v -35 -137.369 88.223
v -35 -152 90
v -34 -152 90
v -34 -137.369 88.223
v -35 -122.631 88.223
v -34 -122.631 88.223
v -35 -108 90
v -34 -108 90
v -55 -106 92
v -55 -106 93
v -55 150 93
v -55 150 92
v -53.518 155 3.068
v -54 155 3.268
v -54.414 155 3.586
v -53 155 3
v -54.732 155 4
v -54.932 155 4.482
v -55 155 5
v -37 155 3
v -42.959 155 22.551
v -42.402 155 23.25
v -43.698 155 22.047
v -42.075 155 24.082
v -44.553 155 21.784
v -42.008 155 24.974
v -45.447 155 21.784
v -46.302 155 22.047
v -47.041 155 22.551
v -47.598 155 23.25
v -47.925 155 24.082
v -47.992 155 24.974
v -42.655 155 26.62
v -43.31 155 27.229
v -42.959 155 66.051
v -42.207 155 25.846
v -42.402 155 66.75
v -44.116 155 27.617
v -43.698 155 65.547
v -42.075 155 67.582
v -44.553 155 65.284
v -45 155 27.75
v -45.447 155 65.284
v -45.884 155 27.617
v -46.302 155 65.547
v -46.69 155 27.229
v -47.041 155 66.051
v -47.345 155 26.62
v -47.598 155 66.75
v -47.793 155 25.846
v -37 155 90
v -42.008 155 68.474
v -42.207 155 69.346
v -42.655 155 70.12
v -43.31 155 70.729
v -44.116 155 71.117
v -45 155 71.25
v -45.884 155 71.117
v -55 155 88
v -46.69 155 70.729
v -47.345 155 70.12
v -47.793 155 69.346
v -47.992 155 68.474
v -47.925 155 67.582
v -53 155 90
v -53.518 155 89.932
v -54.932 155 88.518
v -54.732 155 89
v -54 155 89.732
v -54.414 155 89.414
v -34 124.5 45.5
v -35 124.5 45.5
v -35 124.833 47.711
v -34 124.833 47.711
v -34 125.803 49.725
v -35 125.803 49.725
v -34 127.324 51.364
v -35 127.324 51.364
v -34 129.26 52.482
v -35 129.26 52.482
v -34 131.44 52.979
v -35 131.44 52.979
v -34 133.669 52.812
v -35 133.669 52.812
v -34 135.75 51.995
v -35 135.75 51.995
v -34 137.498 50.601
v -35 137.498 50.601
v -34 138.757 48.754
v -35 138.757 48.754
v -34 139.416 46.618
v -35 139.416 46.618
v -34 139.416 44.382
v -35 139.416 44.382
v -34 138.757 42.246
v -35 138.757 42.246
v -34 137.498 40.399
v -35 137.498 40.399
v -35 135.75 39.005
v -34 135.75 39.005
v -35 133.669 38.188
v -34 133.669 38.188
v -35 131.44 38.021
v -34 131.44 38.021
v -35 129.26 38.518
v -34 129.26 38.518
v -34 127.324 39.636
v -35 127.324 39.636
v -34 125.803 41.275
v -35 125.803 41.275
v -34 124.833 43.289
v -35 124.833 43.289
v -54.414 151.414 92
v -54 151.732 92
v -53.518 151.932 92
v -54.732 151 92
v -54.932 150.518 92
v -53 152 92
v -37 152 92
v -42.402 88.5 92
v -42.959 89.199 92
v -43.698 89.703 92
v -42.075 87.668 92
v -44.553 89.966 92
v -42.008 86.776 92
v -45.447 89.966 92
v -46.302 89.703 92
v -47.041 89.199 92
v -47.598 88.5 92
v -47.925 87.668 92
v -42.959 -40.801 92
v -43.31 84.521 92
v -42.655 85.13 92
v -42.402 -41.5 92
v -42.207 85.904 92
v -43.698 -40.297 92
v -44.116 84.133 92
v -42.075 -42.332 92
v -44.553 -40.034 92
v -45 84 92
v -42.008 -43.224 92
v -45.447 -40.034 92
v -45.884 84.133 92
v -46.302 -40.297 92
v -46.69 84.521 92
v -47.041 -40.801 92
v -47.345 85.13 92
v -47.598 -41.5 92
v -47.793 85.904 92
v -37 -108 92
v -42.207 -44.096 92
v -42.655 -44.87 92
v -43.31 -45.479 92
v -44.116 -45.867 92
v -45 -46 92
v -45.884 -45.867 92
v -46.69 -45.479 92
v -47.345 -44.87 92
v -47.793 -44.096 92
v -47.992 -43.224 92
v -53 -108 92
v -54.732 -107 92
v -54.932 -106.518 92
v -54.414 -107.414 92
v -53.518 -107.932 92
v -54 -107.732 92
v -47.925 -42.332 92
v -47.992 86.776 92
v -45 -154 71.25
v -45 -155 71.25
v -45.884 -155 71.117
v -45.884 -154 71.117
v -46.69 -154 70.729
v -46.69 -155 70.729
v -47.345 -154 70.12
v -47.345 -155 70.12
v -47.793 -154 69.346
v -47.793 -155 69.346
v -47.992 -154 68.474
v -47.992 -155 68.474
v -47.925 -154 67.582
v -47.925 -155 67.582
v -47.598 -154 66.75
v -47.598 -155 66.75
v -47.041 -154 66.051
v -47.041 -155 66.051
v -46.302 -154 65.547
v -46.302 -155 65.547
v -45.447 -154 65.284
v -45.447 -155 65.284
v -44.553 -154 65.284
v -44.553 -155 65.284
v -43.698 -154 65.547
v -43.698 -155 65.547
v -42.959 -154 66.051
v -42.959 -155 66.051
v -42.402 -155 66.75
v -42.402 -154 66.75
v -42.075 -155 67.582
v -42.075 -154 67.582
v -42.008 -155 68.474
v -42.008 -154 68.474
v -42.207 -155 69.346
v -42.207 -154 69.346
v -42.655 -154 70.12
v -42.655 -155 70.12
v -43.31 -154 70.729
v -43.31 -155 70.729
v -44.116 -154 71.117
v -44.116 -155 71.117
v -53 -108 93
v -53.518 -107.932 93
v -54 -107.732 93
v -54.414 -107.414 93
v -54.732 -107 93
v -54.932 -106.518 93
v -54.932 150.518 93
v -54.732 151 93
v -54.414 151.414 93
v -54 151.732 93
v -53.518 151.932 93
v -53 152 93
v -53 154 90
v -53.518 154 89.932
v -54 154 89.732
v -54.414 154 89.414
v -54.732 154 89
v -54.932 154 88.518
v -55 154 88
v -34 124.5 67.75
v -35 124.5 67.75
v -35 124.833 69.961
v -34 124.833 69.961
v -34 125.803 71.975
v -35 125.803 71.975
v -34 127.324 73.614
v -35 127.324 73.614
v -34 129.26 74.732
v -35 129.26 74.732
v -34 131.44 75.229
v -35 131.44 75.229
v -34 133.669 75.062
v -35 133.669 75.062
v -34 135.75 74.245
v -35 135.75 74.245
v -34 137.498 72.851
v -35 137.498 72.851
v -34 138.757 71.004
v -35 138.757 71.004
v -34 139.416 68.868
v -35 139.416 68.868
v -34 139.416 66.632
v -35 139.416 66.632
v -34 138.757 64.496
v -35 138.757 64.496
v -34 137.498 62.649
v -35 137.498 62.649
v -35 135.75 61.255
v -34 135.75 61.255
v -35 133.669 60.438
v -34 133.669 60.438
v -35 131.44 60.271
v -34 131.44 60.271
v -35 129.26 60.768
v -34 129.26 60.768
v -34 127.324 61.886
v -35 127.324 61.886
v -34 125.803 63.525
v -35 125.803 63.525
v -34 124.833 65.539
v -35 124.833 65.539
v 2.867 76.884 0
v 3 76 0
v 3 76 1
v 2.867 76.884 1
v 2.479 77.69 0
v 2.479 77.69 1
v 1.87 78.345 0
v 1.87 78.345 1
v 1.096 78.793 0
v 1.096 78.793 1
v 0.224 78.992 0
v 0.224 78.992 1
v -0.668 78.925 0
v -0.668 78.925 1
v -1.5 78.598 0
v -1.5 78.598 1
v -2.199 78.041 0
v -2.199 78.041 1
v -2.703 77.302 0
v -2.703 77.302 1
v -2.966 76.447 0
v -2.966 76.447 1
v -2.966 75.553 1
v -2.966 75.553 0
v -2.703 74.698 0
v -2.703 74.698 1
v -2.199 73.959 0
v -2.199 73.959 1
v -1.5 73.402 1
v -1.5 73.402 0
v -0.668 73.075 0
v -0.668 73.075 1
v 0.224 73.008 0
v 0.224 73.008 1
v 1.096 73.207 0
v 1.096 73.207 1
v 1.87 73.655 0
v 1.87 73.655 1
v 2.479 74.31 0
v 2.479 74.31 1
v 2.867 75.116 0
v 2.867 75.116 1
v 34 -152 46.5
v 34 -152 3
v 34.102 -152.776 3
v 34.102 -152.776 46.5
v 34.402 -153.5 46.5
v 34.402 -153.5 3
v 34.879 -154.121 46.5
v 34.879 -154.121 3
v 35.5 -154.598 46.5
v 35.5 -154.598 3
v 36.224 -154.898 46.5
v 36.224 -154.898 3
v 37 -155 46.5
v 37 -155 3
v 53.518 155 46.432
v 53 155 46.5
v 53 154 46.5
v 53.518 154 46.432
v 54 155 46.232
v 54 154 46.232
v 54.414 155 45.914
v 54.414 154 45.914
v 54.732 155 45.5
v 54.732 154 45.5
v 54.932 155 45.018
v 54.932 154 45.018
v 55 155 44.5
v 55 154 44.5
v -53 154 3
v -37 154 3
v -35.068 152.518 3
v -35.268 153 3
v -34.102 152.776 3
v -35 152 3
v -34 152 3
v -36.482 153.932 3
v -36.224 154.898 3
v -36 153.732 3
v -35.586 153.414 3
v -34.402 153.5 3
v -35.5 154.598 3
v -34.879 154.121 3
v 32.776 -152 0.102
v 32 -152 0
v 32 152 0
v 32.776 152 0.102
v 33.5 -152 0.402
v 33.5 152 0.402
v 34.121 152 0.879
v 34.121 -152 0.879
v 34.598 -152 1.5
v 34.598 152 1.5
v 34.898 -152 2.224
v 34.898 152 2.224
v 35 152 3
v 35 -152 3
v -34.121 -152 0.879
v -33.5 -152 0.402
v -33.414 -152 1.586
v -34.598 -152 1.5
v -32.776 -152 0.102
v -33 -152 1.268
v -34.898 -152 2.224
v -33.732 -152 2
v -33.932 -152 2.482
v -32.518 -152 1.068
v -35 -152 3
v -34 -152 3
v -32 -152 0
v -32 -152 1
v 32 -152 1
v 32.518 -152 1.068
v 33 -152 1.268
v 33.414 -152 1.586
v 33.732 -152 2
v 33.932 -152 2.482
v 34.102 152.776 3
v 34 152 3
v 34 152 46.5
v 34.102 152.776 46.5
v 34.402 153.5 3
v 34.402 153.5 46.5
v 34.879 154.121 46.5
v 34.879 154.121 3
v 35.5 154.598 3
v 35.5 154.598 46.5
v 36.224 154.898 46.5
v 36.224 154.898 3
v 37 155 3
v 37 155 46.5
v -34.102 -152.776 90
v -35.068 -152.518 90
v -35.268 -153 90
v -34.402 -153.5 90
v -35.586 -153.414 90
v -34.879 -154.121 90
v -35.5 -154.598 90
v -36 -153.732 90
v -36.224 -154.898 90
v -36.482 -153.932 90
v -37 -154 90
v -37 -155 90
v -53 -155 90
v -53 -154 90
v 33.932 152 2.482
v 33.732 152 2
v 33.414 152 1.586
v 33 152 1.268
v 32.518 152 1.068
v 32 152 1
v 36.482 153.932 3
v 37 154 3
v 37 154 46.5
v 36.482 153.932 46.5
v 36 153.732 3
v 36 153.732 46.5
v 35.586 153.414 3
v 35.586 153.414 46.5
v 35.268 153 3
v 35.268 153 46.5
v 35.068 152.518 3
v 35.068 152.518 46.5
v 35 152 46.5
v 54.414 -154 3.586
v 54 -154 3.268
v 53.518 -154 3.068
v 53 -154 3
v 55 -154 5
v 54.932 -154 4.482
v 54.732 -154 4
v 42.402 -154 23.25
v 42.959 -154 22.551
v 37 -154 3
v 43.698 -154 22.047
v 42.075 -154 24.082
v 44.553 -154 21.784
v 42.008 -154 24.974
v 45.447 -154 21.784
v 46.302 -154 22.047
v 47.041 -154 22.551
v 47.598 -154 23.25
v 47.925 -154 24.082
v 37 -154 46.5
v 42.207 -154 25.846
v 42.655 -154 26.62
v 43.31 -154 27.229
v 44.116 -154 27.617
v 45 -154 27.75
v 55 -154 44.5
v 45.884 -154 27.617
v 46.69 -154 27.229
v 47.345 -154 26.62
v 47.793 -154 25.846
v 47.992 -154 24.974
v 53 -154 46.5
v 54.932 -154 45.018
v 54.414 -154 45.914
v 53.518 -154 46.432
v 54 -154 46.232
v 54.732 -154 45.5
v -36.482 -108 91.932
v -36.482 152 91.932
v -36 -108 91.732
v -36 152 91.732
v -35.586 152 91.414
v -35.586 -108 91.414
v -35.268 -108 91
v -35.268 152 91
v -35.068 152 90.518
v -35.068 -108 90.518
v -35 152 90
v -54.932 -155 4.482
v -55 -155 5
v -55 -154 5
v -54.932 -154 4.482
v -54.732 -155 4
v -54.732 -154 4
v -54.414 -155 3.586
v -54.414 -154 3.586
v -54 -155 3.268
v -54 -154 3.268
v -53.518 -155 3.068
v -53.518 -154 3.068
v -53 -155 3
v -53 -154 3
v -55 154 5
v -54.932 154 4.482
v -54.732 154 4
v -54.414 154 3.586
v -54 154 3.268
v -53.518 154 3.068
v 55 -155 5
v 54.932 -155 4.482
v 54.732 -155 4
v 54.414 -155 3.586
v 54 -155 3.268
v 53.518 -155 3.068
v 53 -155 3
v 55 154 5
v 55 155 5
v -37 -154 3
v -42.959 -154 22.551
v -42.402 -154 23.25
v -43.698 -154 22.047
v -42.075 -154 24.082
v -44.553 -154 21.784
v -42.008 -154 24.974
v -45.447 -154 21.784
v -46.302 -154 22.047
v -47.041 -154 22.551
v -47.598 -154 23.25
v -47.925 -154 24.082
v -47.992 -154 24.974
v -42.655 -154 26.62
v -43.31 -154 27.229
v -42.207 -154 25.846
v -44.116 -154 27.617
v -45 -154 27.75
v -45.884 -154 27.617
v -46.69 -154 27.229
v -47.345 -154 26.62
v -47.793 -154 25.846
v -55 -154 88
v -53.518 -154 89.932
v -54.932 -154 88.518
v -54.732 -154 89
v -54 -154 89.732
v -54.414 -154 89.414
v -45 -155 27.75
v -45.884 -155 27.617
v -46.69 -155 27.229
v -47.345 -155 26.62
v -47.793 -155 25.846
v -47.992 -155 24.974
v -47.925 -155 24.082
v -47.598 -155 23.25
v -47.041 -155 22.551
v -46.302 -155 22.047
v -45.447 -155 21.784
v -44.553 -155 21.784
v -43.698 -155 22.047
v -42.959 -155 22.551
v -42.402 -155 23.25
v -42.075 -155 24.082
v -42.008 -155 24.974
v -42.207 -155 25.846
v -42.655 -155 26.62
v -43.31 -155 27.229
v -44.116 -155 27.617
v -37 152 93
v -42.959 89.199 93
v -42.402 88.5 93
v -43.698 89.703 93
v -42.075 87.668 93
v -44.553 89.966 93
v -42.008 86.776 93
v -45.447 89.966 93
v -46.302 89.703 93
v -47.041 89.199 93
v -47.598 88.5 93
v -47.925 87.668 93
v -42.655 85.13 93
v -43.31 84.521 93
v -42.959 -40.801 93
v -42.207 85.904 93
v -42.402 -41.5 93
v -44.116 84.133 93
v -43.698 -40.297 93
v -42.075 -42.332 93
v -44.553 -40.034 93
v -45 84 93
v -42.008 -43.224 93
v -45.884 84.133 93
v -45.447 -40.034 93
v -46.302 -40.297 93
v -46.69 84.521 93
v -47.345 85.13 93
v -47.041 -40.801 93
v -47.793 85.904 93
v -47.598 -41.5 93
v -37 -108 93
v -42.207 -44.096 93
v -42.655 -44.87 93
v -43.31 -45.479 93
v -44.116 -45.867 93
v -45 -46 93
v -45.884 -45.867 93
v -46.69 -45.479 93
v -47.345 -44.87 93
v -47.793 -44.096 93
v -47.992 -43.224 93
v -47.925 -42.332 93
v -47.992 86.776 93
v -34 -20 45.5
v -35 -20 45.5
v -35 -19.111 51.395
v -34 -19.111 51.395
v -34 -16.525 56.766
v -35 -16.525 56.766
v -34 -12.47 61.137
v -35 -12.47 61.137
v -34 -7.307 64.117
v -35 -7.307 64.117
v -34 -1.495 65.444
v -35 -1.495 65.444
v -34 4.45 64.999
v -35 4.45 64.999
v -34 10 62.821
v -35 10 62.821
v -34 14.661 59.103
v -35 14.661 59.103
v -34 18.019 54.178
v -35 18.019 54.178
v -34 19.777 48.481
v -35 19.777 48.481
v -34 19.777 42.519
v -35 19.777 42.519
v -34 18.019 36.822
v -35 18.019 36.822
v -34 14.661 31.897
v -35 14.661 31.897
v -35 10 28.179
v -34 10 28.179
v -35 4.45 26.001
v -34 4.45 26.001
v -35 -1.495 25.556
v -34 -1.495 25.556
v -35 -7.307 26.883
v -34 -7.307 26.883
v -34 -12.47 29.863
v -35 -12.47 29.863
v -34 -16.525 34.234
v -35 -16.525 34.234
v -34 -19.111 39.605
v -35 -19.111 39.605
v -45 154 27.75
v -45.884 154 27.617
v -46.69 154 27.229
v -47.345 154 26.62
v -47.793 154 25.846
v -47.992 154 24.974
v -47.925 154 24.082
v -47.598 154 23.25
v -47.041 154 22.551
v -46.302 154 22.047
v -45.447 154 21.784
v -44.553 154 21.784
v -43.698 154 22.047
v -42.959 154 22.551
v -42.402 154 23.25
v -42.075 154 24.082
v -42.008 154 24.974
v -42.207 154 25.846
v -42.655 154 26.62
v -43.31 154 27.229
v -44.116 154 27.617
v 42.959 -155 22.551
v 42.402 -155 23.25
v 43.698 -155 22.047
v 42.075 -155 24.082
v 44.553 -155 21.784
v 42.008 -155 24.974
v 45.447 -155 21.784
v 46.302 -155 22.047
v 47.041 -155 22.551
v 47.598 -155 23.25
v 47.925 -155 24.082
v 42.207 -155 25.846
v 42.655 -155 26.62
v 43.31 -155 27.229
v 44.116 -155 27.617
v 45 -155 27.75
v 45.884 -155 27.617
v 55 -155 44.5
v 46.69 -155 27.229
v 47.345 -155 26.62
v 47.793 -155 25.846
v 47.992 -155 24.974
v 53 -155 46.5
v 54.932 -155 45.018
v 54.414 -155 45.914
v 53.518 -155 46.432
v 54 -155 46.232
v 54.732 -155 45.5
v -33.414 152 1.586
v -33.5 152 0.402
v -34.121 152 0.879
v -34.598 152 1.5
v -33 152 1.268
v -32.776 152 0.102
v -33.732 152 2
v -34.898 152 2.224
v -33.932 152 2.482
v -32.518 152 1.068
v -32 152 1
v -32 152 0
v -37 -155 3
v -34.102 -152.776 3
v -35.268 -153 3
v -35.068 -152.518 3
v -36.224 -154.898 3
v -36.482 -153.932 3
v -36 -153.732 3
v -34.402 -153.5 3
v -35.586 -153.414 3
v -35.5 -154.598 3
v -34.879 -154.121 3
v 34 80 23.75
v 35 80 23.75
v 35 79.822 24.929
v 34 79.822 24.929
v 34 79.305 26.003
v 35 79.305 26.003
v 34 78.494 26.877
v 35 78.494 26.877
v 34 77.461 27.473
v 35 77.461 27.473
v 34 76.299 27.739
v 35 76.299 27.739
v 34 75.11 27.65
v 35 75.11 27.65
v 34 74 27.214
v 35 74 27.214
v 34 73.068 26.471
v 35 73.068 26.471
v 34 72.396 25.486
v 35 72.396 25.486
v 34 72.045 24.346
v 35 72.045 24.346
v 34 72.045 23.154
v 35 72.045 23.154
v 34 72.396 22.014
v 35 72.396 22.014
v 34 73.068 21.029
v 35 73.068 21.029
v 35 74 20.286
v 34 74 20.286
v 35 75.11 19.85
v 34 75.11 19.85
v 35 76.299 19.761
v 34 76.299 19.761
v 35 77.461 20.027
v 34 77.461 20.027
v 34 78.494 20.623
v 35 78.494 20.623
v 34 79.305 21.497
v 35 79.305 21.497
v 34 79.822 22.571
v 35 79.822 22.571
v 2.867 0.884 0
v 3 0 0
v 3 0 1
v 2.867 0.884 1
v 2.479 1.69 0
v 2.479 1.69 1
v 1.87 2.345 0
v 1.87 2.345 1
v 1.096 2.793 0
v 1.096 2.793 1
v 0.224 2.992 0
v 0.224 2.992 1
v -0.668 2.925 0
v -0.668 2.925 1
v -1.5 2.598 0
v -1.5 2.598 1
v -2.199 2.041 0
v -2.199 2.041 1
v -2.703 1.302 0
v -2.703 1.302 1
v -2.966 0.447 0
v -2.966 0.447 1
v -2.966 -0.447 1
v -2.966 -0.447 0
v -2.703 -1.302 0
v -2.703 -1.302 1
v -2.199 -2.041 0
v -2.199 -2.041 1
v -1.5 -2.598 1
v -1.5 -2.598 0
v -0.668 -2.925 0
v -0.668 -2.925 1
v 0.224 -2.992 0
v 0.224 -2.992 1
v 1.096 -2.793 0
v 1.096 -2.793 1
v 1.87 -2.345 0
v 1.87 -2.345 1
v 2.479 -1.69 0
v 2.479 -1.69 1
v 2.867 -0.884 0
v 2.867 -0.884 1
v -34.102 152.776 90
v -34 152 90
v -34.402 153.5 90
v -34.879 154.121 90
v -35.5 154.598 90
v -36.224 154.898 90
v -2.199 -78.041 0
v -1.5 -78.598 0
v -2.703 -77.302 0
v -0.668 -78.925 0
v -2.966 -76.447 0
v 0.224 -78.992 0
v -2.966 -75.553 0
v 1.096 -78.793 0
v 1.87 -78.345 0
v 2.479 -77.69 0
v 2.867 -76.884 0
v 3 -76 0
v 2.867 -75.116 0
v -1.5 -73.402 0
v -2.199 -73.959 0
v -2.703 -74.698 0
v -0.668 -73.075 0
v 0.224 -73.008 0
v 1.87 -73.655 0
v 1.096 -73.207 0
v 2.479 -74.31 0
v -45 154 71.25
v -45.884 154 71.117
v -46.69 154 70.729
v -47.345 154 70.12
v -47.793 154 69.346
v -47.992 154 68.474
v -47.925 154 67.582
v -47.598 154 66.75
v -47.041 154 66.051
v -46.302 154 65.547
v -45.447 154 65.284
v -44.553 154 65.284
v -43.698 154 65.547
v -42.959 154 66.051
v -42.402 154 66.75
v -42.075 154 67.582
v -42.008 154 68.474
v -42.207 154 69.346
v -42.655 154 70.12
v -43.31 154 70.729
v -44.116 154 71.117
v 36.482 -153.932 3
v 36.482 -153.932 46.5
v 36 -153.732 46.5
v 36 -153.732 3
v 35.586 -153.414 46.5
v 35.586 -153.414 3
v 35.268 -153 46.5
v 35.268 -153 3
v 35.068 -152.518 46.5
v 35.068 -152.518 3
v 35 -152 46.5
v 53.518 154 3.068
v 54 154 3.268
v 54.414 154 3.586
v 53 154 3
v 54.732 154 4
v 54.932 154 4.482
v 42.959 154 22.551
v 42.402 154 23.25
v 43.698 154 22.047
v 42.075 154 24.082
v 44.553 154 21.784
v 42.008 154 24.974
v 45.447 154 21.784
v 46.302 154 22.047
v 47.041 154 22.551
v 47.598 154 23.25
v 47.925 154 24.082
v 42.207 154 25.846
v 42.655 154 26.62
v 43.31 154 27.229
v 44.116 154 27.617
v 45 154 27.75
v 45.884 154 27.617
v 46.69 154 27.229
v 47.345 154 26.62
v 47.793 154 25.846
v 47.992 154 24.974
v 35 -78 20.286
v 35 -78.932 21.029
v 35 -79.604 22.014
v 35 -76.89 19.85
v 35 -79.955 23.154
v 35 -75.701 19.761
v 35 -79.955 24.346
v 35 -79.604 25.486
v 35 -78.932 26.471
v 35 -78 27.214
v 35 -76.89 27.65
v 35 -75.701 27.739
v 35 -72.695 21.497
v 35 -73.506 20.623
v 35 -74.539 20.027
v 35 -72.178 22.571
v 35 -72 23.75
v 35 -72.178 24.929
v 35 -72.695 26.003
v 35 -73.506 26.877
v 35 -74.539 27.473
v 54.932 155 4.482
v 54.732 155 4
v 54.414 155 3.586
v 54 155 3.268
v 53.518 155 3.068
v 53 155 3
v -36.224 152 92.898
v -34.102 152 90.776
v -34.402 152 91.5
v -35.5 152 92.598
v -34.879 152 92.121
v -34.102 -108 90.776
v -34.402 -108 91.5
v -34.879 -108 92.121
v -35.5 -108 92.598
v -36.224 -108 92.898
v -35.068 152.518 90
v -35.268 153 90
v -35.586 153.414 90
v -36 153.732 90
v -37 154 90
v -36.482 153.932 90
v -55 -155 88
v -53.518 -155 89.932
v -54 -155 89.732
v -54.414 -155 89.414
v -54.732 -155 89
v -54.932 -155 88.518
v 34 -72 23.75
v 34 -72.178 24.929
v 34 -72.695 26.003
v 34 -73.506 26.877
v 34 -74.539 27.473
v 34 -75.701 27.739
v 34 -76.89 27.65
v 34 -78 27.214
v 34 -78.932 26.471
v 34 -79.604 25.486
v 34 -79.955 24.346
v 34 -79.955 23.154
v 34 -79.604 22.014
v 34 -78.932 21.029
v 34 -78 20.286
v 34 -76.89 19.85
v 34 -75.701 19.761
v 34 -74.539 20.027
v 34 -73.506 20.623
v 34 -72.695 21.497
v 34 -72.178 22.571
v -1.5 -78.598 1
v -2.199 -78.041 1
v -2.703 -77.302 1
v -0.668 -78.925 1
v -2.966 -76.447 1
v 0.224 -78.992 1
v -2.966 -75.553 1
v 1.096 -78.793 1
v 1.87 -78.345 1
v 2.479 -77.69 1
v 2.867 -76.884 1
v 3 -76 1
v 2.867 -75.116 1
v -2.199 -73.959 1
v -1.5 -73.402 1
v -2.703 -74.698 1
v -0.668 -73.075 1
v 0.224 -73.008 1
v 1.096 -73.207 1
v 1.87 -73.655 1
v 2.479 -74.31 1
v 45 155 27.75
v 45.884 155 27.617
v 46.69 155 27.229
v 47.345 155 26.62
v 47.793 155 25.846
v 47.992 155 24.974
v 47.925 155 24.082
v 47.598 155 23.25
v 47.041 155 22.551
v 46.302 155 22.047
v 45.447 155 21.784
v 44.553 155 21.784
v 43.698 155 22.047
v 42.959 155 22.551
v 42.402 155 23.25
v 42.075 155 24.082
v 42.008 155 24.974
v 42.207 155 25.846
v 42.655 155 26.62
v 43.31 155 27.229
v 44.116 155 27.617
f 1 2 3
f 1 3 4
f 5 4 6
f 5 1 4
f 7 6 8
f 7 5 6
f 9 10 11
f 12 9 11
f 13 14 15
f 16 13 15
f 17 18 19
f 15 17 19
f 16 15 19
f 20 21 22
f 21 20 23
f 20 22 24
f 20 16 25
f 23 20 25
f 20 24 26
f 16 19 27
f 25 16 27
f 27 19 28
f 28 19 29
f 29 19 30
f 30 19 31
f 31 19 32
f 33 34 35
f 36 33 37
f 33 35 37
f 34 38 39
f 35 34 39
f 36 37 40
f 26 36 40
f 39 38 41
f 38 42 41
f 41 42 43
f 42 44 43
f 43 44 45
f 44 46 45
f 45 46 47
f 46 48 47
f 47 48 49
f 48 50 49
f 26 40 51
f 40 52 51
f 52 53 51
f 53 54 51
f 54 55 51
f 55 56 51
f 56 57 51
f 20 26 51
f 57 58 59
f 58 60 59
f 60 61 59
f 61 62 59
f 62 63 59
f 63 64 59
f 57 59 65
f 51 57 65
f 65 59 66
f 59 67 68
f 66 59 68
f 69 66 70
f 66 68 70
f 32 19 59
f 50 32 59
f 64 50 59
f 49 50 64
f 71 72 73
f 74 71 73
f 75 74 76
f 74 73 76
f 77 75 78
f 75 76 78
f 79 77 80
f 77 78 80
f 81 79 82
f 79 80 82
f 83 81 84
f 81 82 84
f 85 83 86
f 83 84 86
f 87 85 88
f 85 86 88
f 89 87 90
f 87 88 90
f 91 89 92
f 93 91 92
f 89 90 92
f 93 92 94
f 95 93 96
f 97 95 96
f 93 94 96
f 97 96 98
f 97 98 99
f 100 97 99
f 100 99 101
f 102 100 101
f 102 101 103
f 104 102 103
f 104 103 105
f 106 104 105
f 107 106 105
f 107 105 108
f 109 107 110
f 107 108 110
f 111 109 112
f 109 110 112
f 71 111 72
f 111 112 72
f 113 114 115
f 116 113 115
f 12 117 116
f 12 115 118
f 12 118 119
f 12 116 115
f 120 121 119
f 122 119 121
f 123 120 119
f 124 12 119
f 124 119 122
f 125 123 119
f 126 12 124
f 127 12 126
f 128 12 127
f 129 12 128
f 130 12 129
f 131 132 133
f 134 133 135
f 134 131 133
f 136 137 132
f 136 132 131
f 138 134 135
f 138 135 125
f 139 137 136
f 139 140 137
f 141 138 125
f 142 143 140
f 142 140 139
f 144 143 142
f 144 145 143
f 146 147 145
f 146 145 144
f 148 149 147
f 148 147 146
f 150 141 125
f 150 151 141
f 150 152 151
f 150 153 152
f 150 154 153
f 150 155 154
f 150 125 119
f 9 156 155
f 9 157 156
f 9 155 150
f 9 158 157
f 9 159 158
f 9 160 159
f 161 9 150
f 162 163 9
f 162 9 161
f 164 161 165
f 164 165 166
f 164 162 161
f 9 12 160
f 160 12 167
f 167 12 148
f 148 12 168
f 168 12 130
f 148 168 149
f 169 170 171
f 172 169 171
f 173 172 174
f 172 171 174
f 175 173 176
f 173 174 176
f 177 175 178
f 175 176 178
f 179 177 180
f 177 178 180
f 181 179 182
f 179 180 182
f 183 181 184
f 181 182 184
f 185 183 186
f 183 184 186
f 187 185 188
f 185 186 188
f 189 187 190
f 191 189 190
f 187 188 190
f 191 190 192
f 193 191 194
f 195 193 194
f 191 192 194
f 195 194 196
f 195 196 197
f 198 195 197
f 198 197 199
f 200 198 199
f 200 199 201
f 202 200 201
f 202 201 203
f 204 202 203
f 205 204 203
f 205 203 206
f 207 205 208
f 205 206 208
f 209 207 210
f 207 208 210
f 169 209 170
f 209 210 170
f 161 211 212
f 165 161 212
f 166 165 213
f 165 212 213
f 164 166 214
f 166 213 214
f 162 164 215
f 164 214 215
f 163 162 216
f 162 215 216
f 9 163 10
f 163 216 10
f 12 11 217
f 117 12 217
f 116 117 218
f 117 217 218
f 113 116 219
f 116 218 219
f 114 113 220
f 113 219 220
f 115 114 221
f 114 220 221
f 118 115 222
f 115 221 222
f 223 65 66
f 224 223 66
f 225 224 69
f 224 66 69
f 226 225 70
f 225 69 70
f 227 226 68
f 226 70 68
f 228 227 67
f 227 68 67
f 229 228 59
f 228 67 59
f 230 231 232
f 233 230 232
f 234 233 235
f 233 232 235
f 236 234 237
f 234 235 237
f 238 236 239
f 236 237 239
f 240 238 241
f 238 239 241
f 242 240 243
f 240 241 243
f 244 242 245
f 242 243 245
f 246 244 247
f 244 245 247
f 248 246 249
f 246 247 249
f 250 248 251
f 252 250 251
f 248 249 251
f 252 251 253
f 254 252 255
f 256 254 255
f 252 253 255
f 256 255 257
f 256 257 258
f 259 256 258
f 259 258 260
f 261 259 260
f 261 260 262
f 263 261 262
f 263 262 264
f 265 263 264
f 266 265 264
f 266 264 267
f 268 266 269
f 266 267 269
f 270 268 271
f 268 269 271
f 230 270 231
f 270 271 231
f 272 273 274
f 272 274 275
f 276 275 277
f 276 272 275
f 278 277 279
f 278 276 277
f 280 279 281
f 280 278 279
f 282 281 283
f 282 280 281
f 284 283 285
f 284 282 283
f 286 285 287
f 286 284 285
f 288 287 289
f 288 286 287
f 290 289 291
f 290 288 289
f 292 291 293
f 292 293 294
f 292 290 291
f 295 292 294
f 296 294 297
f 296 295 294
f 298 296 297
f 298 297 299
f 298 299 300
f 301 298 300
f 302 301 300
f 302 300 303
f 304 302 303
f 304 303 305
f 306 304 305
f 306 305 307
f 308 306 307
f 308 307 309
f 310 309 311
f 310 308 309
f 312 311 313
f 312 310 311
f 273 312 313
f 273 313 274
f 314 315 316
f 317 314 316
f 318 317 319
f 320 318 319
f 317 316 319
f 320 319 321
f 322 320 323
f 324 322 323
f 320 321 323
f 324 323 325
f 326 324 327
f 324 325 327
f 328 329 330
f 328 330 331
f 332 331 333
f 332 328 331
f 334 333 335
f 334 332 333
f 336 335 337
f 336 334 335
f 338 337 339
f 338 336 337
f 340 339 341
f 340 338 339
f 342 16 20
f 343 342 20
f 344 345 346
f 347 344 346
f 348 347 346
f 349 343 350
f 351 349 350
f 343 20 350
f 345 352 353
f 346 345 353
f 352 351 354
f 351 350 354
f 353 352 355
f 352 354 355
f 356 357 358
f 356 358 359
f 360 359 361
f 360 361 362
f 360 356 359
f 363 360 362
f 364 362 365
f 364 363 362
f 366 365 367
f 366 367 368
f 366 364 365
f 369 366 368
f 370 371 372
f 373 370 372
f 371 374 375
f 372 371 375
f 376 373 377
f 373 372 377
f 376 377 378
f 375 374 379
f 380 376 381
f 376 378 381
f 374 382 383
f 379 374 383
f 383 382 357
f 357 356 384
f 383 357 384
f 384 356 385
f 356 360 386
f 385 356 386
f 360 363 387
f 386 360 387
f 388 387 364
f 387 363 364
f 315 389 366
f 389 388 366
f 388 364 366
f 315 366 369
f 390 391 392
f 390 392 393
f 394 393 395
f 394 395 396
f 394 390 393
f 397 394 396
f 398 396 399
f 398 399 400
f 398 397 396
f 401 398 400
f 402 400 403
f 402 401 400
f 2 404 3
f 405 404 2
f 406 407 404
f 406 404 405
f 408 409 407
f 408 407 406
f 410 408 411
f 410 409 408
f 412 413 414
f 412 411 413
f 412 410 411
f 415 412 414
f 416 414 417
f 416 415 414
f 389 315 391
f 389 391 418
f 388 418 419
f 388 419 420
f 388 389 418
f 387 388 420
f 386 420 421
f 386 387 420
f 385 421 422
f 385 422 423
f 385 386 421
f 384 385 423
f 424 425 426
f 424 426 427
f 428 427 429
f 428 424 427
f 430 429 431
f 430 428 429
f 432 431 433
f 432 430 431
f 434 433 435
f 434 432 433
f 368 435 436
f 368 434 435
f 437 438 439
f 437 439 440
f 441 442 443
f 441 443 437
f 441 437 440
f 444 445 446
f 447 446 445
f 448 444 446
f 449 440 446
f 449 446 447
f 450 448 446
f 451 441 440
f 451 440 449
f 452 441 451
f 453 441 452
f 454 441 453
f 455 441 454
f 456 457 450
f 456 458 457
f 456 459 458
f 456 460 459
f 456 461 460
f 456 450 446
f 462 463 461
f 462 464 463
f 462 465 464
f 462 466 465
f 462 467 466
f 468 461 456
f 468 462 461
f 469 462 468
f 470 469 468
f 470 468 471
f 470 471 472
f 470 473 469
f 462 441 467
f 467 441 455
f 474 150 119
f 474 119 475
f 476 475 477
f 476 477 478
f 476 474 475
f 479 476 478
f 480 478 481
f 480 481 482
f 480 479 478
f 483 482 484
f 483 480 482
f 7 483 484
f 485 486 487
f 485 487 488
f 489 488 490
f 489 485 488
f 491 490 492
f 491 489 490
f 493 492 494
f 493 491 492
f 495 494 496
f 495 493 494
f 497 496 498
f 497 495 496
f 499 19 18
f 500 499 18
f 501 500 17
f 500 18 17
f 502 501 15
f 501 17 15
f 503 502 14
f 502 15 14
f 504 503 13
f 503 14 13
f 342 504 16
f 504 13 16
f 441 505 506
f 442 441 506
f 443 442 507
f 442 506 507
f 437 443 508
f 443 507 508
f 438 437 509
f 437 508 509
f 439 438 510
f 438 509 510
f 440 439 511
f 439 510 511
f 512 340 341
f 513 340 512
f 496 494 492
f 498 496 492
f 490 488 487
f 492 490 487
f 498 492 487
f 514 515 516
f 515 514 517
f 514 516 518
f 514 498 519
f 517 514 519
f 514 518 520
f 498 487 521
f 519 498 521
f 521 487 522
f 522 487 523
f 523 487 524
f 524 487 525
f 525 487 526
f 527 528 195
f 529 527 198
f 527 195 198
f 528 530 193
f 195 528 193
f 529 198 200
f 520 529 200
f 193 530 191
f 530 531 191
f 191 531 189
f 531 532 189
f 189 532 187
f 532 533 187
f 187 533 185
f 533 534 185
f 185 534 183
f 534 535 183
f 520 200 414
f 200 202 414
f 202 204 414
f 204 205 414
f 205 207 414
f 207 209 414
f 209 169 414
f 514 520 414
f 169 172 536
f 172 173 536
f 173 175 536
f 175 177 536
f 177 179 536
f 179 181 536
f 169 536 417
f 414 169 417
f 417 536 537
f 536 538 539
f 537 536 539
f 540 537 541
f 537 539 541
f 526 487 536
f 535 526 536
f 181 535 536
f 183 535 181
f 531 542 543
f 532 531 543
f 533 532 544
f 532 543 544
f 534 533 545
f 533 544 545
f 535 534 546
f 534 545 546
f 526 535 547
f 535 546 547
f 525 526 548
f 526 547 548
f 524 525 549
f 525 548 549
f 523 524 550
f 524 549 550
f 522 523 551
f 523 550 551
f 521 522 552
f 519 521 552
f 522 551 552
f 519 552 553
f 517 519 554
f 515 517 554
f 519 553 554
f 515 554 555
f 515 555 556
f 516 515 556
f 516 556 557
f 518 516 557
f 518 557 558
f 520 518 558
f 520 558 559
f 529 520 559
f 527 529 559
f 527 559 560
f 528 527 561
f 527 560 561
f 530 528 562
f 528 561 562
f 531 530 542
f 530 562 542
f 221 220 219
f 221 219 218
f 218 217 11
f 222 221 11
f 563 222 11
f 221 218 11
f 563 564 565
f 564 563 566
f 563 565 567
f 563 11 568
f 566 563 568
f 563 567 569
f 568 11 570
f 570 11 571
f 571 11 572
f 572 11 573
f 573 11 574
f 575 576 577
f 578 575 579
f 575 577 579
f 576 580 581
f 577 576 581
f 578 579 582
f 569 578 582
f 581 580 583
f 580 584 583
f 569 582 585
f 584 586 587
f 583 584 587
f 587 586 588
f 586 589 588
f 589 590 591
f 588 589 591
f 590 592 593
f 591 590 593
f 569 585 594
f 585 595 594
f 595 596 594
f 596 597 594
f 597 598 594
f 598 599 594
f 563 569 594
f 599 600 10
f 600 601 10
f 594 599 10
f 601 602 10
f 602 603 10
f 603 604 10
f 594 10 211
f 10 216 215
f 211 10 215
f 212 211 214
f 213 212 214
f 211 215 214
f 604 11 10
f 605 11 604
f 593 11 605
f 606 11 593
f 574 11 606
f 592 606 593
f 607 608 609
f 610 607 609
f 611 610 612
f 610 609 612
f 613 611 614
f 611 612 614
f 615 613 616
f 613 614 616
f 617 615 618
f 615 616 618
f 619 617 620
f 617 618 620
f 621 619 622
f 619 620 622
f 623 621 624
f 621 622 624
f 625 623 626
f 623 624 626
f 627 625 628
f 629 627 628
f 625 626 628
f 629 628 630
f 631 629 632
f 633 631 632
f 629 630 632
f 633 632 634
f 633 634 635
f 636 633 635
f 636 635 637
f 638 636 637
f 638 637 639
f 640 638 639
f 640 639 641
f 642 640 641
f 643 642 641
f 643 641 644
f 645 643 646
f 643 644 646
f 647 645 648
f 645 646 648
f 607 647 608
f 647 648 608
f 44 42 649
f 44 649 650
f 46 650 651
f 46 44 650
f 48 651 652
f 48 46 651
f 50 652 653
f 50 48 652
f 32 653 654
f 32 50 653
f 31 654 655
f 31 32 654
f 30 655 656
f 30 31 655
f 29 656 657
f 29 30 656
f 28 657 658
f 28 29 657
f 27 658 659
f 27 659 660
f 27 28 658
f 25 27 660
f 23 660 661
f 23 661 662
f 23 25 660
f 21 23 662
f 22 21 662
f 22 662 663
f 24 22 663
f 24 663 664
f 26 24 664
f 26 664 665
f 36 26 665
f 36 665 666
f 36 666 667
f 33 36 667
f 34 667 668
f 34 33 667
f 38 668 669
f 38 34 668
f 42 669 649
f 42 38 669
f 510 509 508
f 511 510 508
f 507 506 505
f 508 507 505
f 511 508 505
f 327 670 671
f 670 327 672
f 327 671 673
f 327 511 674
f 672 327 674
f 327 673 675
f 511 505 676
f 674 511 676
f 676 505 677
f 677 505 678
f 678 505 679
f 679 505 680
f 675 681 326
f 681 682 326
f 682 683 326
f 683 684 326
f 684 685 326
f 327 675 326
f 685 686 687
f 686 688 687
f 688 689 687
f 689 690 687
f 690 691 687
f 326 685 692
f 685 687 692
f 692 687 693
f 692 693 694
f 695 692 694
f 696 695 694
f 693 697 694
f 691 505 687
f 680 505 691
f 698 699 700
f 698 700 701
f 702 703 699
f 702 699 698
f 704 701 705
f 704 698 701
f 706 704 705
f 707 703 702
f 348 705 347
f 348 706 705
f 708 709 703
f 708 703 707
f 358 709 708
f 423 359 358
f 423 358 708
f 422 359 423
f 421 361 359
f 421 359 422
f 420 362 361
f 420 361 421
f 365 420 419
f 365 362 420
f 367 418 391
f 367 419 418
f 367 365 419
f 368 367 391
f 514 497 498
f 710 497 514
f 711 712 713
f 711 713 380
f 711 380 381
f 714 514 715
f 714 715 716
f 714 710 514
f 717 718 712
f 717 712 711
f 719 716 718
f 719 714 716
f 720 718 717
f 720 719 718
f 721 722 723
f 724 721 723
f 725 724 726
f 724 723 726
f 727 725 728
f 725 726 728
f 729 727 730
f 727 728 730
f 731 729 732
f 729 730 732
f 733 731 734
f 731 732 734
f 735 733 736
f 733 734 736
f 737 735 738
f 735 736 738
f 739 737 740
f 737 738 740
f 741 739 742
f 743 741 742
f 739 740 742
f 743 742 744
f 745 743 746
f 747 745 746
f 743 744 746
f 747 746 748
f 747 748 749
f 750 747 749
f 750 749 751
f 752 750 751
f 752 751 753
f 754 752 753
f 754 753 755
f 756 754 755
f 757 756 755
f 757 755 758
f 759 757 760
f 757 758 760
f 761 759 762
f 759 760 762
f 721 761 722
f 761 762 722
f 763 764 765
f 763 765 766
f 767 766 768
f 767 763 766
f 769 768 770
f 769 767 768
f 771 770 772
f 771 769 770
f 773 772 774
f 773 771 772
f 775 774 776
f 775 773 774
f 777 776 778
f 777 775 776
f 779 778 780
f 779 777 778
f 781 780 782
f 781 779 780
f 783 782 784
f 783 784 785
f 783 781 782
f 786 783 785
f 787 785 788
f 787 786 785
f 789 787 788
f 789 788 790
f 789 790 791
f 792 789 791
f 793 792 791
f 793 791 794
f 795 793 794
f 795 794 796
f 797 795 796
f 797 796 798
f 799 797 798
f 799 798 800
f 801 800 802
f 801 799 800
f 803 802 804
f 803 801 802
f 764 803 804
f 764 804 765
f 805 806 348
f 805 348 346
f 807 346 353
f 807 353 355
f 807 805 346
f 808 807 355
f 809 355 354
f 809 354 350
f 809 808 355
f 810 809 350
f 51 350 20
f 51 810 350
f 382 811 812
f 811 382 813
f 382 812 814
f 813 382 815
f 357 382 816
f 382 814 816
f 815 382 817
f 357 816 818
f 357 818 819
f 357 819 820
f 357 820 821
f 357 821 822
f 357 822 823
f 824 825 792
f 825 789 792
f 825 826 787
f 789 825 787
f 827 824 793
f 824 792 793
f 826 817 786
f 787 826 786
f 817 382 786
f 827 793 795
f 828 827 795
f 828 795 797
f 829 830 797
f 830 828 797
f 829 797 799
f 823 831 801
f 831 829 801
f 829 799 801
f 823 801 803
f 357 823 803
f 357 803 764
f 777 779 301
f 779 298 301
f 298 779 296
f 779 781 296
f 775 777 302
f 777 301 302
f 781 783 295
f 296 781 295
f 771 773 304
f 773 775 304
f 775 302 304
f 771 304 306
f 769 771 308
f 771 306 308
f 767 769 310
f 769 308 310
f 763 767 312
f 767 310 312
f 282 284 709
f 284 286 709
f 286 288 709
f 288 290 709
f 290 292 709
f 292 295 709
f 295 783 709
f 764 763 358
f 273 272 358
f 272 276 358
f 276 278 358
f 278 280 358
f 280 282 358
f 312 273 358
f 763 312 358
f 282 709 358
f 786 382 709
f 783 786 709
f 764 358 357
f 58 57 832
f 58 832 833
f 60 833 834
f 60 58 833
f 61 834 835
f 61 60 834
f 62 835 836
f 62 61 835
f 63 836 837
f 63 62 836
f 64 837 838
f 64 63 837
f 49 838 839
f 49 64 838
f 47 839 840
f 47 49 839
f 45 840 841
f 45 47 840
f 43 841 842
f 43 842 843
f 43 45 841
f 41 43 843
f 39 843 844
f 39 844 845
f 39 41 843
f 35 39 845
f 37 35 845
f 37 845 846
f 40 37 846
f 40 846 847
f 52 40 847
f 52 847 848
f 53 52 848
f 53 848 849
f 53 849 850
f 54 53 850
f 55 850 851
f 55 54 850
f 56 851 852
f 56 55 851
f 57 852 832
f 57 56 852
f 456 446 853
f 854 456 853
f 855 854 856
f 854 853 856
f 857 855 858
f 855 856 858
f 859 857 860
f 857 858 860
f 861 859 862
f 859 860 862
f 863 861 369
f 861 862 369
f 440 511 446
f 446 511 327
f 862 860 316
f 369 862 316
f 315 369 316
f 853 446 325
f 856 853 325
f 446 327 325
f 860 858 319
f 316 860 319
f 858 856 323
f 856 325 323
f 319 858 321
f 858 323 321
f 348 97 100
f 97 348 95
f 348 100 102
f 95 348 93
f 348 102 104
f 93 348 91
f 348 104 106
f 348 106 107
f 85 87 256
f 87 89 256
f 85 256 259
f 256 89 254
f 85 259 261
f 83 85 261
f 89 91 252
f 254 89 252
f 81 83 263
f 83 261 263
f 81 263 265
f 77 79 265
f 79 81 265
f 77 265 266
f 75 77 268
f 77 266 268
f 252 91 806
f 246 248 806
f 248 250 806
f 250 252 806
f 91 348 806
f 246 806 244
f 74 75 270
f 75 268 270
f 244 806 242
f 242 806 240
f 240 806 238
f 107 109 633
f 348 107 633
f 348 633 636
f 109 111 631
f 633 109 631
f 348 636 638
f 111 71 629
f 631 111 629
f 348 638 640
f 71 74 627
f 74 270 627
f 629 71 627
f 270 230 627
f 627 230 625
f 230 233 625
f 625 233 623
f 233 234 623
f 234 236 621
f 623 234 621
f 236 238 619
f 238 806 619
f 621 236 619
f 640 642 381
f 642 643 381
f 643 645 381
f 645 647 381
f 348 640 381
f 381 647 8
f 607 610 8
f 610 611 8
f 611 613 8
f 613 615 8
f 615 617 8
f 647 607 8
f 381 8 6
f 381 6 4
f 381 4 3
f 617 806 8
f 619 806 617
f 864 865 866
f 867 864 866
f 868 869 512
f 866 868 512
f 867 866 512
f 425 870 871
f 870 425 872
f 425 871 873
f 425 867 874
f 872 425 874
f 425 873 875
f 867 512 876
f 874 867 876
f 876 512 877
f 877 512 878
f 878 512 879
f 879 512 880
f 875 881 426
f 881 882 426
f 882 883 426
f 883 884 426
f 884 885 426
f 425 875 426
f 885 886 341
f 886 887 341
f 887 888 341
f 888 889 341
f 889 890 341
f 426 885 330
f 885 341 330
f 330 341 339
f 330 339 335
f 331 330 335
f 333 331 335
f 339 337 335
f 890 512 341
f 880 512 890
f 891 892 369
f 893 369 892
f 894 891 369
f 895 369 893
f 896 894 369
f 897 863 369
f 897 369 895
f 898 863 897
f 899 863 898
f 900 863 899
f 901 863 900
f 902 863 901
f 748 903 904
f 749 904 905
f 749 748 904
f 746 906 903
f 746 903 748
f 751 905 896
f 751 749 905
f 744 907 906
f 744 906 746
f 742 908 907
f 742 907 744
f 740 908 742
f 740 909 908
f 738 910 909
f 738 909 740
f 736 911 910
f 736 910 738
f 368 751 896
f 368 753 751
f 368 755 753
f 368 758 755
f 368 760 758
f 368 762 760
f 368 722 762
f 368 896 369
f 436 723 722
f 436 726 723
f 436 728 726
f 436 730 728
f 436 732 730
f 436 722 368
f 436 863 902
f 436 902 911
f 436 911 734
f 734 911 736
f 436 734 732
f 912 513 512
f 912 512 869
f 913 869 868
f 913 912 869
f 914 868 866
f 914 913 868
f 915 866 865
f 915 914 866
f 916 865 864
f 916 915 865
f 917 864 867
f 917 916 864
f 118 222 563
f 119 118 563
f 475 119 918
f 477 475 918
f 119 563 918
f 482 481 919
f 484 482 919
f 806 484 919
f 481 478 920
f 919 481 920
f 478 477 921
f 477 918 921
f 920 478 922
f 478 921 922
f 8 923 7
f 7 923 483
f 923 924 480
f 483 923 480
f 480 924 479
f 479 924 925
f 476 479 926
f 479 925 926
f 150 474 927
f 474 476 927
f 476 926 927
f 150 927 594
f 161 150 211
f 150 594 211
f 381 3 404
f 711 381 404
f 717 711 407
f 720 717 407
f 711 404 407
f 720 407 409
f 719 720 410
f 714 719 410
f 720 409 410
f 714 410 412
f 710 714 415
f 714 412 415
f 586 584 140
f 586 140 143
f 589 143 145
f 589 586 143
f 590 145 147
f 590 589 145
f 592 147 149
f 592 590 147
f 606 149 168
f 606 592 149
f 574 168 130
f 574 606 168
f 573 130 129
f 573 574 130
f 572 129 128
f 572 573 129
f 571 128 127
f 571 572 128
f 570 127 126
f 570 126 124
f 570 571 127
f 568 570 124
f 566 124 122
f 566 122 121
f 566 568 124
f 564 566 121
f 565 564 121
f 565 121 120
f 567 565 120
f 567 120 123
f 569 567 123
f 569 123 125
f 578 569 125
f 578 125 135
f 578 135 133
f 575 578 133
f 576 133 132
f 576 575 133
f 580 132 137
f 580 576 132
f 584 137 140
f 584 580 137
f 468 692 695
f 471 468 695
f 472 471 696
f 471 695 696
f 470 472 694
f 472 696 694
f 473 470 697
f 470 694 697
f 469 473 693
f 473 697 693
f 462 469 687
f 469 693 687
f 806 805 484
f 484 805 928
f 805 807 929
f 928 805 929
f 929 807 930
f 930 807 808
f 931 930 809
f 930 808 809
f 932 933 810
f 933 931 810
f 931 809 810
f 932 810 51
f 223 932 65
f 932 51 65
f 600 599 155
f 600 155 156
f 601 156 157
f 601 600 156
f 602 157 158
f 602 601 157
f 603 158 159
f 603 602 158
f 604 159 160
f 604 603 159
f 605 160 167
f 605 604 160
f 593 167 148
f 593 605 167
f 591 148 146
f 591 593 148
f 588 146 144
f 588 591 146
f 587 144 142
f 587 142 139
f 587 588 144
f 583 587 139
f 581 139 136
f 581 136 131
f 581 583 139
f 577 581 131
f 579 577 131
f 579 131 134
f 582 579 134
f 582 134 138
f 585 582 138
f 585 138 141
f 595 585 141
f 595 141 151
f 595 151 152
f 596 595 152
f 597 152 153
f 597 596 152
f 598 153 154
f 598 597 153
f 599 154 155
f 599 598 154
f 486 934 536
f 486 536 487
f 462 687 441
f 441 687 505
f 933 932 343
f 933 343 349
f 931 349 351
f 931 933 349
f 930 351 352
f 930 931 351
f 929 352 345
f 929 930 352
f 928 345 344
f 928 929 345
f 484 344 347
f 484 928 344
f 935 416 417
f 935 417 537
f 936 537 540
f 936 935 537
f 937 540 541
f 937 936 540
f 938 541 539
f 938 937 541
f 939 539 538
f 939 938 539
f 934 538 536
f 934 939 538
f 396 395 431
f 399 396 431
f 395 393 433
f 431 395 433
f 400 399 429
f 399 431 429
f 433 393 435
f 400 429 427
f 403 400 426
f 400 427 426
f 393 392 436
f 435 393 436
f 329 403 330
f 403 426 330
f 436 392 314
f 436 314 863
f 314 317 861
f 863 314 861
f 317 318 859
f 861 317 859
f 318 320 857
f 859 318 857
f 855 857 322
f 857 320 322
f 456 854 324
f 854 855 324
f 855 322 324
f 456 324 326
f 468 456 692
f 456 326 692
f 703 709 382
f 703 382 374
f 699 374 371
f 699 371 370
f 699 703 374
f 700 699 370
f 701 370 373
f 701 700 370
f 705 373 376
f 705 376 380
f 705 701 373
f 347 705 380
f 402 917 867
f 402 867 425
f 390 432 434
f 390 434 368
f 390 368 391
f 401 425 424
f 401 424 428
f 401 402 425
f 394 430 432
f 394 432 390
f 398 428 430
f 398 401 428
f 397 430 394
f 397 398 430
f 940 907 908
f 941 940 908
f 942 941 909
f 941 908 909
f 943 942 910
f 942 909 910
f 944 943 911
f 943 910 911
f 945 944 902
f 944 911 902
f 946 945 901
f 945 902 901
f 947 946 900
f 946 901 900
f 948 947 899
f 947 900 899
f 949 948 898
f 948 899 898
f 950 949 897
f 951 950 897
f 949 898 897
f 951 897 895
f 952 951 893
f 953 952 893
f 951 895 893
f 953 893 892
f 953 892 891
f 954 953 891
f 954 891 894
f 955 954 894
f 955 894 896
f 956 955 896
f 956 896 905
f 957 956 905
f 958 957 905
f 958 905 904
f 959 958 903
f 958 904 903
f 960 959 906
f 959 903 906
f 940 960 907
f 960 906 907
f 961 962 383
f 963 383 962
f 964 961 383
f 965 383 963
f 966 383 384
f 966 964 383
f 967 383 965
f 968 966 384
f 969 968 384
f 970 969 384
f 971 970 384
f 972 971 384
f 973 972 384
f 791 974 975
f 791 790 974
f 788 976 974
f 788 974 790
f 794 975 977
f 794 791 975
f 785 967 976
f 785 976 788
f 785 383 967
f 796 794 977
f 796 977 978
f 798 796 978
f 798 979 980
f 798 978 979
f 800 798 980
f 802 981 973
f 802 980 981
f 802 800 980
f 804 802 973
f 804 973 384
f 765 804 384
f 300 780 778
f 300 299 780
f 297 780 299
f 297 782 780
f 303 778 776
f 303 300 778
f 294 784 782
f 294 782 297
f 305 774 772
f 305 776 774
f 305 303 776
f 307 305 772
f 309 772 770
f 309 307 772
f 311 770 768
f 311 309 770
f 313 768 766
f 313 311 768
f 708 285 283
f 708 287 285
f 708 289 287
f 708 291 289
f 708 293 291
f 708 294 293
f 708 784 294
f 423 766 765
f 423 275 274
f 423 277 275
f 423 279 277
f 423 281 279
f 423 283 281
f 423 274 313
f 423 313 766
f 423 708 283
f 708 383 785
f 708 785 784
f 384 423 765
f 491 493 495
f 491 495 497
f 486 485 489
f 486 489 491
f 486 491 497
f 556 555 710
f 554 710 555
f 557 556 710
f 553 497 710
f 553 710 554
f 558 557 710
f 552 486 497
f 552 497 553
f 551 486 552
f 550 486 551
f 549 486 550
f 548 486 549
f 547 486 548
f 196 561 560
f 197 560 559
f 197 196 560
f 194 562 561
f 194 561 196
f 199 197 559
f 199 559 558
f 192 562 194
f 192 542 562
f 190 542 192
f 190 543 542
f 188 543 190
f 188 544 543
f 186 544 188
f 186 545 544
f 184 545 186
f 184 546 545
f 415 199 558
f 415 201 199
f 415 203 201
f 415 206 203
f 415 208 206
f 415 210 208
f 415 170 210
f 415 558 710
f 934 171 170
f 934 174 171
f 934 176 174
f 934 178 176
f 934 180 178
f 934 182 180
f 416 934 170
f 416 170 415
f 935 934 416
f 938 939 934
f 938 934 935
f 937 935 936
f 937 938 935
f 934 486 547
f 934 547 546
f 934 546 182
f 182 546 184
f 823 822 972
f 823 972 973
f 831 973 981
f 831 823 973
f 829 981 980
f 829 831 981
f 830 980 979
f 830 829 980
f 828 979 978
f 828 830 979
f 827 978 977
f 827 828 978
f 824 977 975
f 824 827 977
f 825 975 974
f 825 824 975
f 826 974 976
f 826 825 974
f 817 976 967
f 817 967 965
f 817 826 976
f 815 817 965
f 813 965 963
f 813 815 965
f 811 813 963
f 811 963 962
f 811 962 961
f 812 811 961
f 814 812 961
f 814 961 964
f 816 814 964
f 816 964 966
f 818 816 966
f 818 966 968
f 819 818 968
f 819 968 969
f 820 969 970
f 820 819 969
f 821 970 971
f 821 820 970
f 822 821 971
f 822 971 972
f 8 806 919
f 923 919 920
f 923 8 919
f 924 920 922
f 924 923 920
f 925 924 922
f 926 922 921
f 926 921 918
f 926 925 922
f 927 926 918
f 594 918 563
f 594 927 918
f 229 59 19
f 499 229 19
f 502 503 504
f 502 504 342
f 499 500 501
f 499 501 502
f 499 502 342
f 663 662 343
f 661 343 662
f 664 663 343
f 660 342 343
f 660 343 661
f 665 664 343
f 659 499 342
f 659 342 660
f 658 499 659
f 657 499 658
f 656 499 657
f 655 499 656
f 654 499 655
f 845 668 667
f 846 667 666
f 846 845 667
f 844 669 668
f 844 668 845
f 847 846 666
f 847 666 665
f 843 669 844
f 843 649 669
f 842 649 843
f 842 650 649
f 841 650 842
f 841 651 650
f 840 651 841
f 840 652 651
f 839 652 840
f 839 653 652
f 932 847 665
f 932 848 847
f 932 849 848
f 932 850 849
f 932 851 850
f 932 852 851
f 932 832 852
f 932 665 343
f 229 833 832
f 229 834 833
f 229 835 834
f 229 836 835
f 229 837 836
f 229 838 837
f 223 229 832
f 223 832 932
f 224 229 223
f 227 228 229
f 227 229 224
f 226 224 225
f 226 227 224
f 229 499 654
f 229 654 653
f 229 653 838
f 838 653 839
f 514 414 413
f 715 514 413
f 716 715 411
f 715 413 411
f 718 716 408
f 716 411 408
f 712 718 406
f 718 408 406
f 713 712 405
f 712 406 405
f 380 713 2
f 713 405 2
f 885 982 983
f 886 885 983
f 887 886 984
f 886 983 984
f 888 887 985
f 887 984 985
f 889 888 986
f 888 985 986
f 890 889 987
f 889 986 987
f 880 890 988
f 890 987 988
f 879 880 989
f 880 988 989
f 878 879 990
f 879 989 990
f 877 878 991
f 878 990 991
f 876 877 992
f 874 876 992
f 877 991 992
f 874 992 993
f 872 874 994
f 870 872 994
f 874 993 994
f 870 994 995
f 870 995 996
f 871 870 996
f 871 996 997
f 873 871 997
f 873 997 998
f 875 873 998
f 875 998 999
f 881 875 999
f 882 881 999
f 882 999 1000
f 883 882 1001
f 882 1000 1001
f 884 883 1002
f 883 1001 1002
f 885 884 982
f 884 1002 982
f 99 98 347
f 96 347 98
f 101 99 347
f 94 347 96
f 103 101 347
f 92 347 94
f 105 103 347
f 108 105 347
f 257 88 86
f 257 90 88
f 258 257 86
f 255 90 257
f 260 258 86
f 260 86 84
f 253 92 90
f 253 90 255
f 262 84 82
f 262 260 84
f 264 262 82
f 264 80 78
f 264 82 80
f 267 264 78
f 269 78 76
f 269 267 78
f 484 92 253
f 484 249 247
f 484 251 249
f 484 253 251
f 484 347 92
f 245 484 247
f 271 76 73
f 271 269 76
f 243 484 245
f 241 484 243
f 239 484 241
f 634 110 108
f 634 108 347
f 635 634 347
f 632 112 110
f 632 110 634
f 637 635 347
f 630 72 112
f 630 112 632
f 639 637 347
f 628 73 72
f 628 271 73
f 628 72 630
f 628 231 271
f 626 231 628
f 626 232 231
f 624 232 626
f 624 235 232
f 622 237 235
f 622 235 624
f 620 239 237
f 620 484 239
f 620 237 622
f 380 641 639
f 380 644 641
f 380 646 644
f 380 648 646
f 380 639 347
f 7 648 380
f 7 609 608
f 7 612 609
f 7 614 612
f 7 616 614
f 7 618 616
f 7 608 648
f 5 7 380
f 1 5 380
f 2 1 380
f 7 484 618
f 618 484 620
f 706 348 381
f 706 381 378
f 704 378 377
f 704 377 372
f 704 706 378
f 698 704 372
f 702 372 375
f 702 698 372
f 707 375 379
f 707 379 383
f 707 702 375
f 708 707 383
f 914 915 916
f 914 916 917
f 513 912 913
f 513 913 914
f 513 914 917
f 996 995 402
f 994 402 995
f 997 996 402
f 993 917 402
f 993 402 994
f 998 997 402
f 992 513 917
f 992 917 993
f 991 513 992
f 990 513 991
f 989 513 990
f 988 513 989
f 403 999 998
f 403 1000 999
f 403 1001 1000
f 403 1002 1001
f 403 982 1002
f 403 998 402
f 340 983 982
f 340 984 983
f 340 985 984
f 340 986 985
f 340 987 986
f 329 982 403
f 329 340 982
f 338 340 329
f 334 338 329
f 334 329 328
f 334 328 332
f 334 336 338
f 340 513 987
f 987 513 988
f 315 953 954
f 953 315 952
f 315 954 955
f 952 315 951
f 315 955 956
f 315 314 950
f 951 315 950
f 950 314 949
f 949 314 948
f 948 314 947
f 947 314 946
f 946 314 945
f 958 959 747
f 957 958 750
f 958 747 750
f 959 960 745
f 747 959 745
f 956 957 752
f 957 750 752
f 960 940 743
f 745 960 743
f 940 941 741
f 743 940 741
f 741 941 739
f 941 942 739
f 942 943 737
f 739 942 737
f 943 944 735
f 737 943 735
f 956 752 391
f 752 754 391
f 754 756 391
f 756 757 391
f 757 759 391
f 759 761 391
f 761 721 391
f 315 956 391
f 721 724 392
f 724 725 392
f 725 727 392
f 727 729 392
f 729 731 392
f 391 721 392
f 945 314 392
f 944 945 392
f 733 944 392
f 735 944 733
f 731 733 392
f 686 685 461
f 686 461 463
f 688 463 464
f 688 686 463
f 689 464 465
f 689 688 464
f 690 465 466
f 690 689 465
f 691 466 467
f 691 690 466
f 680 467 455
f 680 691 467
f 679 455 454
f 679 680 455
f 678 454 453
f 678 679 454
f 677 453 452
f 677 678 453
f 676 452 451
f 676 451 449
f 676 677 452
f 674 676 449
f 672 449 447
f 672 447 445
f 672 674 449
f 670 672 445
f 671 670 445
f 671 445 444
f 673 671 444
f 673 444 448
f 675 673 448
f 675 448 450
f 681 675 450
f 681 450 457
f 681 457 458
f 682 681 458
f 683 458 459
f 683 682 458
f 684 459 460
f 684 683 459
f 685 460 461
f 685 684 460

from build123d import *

# Parameters (mm, degrees)
SKETCH1_W                = 64
SKETCH1_H                = 304
SKETCH1_R                = 3
BOSS_EXTRUDE1_DEPTH      = 1
EDGE_FLANGE1_DEPTH       = 304
EDGE_FLANGE1_START       = 1
EDGE_FLANGE1_PROFILE_R   = 7.5
EDGE_FLANGE1_PROFILE_R_2 = 20
EDGE_FLANGE1_FLAT_DEPTH  = 1
EDGE_FLANGE2_DEPTH       = 260
EDGE_FLANGE2_START       = -1
EDGE_FLANGE2_PROFILE_R   = 3
EDGE_FLANGE2_FLAT_DEPTH  = 1
EDGE_FLANGE3_DEPTH       = 87
EDGE_FLANGE3_START       = -1
EDGE_FLANGE3_PROFILE_R   = 3
EDGE_FLANGE3_FLAT_DEPTH  = 1
EDGE_FLANGE4_DEPTH       = 304
EDGE_FLANGE4_START       = 1
EDGE_FLANGE4_PROFILE_W   = 304
EDGE_FLANGE4_PROFILE_H   = 43.5
EDGE_FLANGE4_PROFILE_R   = 4
EDGE_FLANGE4_FLAT_DEPTH  = 1
EDGE_FLANGE5_DEPTH       = 43.5
EDGE_FLANGE5_START       = 1
EDGE_FLANGE5_PROFILE_R   = 3
EDGE_FLANGE5_FLAT_DEPTH  = 1


# Sheet-metal steps are written as plain solids
with BuildPart() as part:
    # Sketch1 → Boss-Extrude1 (new body)
    with BuildSketch(Plane.XY):
        Rectangle(SKETCH1_W, SKETCH1_H)
        Circle(SKETCH1_R, mode=Mode.SUBTRACT)
        with Locations((0, 76)):
            Circle(SKETCH1_R, mode=Mode.SUBTRACT)
        with Locations((0, -76)):
            Circle(SKETCH1_R, mode=Mode.SUBTRACT)
    extrude(amount=BOSS_EXTRUDE1_DEPTH)

    # Edge-Flange1 bend section (across the edge) → Edge-Flange1 (add)
    with BuildSketch(Plane(origin=(-34, 152, 1), x_dir=(1, 0, 0), z_dir=(0, -1, 0))):
        with BuildLine():
            Line((-1, 2), (0, 2))
            ThreePointArc((0, 2), (0.585786438, 0.585786438), (2, 0))
            Line((2, 0), (2, -1))
            ThreePointArc((2, -1), (-0.121320344, -0.121320344), (-1, 2))
        make_face()
    extrude(amount=EDGE_FLANGE1_DEPTH)

    # Edge-Flange1 profile (on flange) → Edge-Flange1 flat (add)
    with BuildSketch(Plane(origin=(-34, 0, 1), x_dir=(0, -1, 0), z_dir=(-1, 0, 0)).offset(EDGE_FLANGE1_START)):
        with BuildLine():
            ThreePointArc((152, 89), (130, 87), (108, 89))
            Line((108, 89), (-152, 89))
            Line((-152, 89), (-152, 2))
            Line((-152, 2), (152, 2))
            Line((152, 2), (152, 89))
        make_face()
        with Locations((-132, 44.5)):
            Circle(EDGE_FLANGE1_PROFILE_R, mode=Mode.SUBTRACT)
        with Locations((0, 44.5)):
            Circle(EDGE_FLANGE1_PROFILE_R_2, mode=Mode.SUBTRACT)
        with Locations((-132, 66.75)):
            Circle(EDGE_FLANGE1_PROFILE_R, mode=Mode.SUBTRACT)
    extrude(amount=-EDGE_FLANGE1_FLAT_DEPTH)

    # Edge-Flange2 bend section (across the edge) → Edge-Flange2 (add)
    with BuildSketch(Plane(origin=(-35, -108, 92), x_dir=(0, 0, -1), z_dir=(0, 1, 0))):
        with BuildLine():
            Line((-1, 2), (0, 2))
            ThreePointArc((0, 2), (0.585786438, 0.585786438), (2, 0))
            Line((2, 0), (2, -1))
            ThreePointArc((2, -1), (-0.121320344, -0.121320344), (-1, 2))
        make_face()
    extrude(amount=EDGE_FLANGE2_DEPTH)

    # Edge-Flange2 profile (on flange) → Edge-Flange2 flat (add)
    with BuildSketch(Plane(origin=(-35, 0, 92), x_dir=(0, -1, 0), z_dir=(0, 0, -1)).offset(EDGE_FLANGE2_START)):
        with BuildLine():
            Line((-152, 2), (108, 2))
            Line((108, 2), (108, 18))
            ThreePointArc((108, 18), (107.414213562, 19.414213562), (106, 20))
            Line((106, 20), (-150, 20))
            ThreePointArc((-150, 20), (-151.414213562, 19.414213562), (-152, 18))
            Line((-152, 18), (-152, 2))
        make_face()
        with Locations((43, 10)):
            Circle(EDGE_FLANGE2_PROFILE_R, mode=Mode.SUBTRACT)
        with Locations((-87, 10)):
            Circle(EDGE_FLANGE2_PROFILE_R, mode=Mode.SUBTRACT)
    extrude(amount=EDGE_FLANGE2_FLAT_DEPTH)

    # Edge-Flange3 bend section (across the edge) → Edge-Flange3 (add)
    with BuildSketch(Plane(origin=(-35, 154, 90), x_dir=(0, -1, 0), z_dir=(0, 0, -1))):
        with BuildLine():
            Line((-1, 2), (0, 2))
            ThreePointArc((0, 2), (0.585786438, 0.585786438), (2, 0))
            Line((2, 0), (2, -1))
            ThreePointArc((2, -1), (-0.121320344, -0.121320344), (-1, 2))
        make_face()
    edge_flange3 = extrude(amount=EDGE_FLANGE3_DEPTH)

    # Edge-Flange3 profile (on flange) → Edge-Flange3 flat (add)
    with BuildSketch(Plane(origin=(-35, 154, 0), x_dir=(0, 0, 1), z_dir=(0, -1, 0)).offset(EDGE_FLANGE3_START)):
        with BuildLine():
            Line((3, 2), (90, 2))
            Line((90, 2), (90, 18))
            ThreePointArc((90, 18), (89.414213562, 19.414213562), (88, 20))
            Line((88, 20), (5, 20))
            ThreePointArc((5, 20), (3.585786438, 19.414213562), (3, 18))
            Line((3, 18), (3, 2))
        make_face()
        with Locations((24.75, 10)):
            Circle(EDGE_FLANGE3_PROFILE_R, mode=Mode.SUBTRACT)
        with Locations((68.25, 10)):
            Circle(EDGE_FLANGE3_PROFILE_R, mode=Mode.SUBTRACT)
    edge_flange3_flat = extrude(amount=EDGE_FLANGE3_FLAT_DEPTH)

    # Mirror1: Edge-Flange3, Edge-Flange3 flat across plane
    add(edge_flange3.mirror(Plane.ZX))
    add(edge_flange3_flat.mirror(Plane.ZX))

    # Edge-Flange4 bend section (across the edge) → Edge-Flange4 (add)
    with BuildSketch(Plane(origin=(34, -152, 1), x_dir=(-1, 0, 0), z_dir=(0, 1, 0))):
        with BuildLine():
            Line((-1, 2), (0, 2))
            ThreePointArc((0, 2), (0.585786438, 0.585786438), (2, 0))
            Line((2, 0), (2, -1))
            ThreePointArc((2, -1), (-0.121320344, -0.121320344), (-1, 2))
        make_face()
    extrude(amount=EDGE_FLANGE4_DEPTH)

    # Edge-Flange4 profile (on flange) → Edge-Flange4 flat (add)
    with BuildSketch(Plane(origin=(34, 0, 1), x_dir=(0, 1, 0), z_dir=(1, 0, 0)).offset(EDGE_FLANGE4_START)):
        with Locations((0, 23.75)):
            Rectangle(EDGE_FLANGE4_PROFILE_W, EDGE_FLANGE4_PROFILE_H)
        with Locations((-76, 22.75)):
            Circle(EDGE_FLANGE4_PROFILE_R, mode=Mode.SUBTRACT)
        with Locations((76, 22.75)):
            Circle(EDGE_FLANGE4_PROFILE_R, mode=Mode.SUBTRACT)
    extrude(amount=-EDGE_FLANGE4_FLAT_DEPTH)

    # Edge-Flange5 bend section (across the edge) → Edge-Flange5 (add)
    with BuildSketch(Plane(origin=(35, 154, 3), x_dir=(0, -1, 0), z_dir=(0, 0, 1))):
        with BuildLine():
            Line((-1, 2), (0, 2))
            ThreePointArc((0, 2), (0.585786438, 0.585786438), (2, 0))
            Line((2, 0), (2, -1))
            ThreePointArc((2, -1), (-0.121320344, -0.121320344), (-1, 2))
        make_face()
    edge_flange5 = extrude(amount=EDGE_FLANGE5_DEPTH)

    # Edge-Flange5 profile (on flange) → Edge-Flange5 flat (add)
    with BuildSketch(Plane(origin=(35, 154, 0), x_dir=(0, 0, 1), z_dir=(0, 1, 0)).offset(EDGE_FLANGE5_START)):
        with BuildLine():
            ThreePointArc((5, 20), (3.585786438, 19.414213562), (3, 18))
            Line((3, 18), (3, 2))
            Line((3, 2), (46.5, 2))
            Line((46.5, 2), (46.5, 18))
            ThreePointArc((46.5, 18), (45.914213562, 19.414213562), (44.5, 20))
            Line((44.5, 20), (5, 20))
        make_face()
        with Locations((24.75, 10)):
            Circle(EDGE_FLANGE5_PROFILE_R, mode=Mode.SUBTRACT)
    edge_flange5_flat = extrude(amount=-EDGE_FLANGE5_FLAT_DEPTH)

    # Mirror2: Edge-Flange5, Edge-Flange5 flat across plane
    add(edge_flange5.mirror(Plane.ZX))
    add(edge_flange5_flat.mirror(Plane.ZX))


solid = part.part
